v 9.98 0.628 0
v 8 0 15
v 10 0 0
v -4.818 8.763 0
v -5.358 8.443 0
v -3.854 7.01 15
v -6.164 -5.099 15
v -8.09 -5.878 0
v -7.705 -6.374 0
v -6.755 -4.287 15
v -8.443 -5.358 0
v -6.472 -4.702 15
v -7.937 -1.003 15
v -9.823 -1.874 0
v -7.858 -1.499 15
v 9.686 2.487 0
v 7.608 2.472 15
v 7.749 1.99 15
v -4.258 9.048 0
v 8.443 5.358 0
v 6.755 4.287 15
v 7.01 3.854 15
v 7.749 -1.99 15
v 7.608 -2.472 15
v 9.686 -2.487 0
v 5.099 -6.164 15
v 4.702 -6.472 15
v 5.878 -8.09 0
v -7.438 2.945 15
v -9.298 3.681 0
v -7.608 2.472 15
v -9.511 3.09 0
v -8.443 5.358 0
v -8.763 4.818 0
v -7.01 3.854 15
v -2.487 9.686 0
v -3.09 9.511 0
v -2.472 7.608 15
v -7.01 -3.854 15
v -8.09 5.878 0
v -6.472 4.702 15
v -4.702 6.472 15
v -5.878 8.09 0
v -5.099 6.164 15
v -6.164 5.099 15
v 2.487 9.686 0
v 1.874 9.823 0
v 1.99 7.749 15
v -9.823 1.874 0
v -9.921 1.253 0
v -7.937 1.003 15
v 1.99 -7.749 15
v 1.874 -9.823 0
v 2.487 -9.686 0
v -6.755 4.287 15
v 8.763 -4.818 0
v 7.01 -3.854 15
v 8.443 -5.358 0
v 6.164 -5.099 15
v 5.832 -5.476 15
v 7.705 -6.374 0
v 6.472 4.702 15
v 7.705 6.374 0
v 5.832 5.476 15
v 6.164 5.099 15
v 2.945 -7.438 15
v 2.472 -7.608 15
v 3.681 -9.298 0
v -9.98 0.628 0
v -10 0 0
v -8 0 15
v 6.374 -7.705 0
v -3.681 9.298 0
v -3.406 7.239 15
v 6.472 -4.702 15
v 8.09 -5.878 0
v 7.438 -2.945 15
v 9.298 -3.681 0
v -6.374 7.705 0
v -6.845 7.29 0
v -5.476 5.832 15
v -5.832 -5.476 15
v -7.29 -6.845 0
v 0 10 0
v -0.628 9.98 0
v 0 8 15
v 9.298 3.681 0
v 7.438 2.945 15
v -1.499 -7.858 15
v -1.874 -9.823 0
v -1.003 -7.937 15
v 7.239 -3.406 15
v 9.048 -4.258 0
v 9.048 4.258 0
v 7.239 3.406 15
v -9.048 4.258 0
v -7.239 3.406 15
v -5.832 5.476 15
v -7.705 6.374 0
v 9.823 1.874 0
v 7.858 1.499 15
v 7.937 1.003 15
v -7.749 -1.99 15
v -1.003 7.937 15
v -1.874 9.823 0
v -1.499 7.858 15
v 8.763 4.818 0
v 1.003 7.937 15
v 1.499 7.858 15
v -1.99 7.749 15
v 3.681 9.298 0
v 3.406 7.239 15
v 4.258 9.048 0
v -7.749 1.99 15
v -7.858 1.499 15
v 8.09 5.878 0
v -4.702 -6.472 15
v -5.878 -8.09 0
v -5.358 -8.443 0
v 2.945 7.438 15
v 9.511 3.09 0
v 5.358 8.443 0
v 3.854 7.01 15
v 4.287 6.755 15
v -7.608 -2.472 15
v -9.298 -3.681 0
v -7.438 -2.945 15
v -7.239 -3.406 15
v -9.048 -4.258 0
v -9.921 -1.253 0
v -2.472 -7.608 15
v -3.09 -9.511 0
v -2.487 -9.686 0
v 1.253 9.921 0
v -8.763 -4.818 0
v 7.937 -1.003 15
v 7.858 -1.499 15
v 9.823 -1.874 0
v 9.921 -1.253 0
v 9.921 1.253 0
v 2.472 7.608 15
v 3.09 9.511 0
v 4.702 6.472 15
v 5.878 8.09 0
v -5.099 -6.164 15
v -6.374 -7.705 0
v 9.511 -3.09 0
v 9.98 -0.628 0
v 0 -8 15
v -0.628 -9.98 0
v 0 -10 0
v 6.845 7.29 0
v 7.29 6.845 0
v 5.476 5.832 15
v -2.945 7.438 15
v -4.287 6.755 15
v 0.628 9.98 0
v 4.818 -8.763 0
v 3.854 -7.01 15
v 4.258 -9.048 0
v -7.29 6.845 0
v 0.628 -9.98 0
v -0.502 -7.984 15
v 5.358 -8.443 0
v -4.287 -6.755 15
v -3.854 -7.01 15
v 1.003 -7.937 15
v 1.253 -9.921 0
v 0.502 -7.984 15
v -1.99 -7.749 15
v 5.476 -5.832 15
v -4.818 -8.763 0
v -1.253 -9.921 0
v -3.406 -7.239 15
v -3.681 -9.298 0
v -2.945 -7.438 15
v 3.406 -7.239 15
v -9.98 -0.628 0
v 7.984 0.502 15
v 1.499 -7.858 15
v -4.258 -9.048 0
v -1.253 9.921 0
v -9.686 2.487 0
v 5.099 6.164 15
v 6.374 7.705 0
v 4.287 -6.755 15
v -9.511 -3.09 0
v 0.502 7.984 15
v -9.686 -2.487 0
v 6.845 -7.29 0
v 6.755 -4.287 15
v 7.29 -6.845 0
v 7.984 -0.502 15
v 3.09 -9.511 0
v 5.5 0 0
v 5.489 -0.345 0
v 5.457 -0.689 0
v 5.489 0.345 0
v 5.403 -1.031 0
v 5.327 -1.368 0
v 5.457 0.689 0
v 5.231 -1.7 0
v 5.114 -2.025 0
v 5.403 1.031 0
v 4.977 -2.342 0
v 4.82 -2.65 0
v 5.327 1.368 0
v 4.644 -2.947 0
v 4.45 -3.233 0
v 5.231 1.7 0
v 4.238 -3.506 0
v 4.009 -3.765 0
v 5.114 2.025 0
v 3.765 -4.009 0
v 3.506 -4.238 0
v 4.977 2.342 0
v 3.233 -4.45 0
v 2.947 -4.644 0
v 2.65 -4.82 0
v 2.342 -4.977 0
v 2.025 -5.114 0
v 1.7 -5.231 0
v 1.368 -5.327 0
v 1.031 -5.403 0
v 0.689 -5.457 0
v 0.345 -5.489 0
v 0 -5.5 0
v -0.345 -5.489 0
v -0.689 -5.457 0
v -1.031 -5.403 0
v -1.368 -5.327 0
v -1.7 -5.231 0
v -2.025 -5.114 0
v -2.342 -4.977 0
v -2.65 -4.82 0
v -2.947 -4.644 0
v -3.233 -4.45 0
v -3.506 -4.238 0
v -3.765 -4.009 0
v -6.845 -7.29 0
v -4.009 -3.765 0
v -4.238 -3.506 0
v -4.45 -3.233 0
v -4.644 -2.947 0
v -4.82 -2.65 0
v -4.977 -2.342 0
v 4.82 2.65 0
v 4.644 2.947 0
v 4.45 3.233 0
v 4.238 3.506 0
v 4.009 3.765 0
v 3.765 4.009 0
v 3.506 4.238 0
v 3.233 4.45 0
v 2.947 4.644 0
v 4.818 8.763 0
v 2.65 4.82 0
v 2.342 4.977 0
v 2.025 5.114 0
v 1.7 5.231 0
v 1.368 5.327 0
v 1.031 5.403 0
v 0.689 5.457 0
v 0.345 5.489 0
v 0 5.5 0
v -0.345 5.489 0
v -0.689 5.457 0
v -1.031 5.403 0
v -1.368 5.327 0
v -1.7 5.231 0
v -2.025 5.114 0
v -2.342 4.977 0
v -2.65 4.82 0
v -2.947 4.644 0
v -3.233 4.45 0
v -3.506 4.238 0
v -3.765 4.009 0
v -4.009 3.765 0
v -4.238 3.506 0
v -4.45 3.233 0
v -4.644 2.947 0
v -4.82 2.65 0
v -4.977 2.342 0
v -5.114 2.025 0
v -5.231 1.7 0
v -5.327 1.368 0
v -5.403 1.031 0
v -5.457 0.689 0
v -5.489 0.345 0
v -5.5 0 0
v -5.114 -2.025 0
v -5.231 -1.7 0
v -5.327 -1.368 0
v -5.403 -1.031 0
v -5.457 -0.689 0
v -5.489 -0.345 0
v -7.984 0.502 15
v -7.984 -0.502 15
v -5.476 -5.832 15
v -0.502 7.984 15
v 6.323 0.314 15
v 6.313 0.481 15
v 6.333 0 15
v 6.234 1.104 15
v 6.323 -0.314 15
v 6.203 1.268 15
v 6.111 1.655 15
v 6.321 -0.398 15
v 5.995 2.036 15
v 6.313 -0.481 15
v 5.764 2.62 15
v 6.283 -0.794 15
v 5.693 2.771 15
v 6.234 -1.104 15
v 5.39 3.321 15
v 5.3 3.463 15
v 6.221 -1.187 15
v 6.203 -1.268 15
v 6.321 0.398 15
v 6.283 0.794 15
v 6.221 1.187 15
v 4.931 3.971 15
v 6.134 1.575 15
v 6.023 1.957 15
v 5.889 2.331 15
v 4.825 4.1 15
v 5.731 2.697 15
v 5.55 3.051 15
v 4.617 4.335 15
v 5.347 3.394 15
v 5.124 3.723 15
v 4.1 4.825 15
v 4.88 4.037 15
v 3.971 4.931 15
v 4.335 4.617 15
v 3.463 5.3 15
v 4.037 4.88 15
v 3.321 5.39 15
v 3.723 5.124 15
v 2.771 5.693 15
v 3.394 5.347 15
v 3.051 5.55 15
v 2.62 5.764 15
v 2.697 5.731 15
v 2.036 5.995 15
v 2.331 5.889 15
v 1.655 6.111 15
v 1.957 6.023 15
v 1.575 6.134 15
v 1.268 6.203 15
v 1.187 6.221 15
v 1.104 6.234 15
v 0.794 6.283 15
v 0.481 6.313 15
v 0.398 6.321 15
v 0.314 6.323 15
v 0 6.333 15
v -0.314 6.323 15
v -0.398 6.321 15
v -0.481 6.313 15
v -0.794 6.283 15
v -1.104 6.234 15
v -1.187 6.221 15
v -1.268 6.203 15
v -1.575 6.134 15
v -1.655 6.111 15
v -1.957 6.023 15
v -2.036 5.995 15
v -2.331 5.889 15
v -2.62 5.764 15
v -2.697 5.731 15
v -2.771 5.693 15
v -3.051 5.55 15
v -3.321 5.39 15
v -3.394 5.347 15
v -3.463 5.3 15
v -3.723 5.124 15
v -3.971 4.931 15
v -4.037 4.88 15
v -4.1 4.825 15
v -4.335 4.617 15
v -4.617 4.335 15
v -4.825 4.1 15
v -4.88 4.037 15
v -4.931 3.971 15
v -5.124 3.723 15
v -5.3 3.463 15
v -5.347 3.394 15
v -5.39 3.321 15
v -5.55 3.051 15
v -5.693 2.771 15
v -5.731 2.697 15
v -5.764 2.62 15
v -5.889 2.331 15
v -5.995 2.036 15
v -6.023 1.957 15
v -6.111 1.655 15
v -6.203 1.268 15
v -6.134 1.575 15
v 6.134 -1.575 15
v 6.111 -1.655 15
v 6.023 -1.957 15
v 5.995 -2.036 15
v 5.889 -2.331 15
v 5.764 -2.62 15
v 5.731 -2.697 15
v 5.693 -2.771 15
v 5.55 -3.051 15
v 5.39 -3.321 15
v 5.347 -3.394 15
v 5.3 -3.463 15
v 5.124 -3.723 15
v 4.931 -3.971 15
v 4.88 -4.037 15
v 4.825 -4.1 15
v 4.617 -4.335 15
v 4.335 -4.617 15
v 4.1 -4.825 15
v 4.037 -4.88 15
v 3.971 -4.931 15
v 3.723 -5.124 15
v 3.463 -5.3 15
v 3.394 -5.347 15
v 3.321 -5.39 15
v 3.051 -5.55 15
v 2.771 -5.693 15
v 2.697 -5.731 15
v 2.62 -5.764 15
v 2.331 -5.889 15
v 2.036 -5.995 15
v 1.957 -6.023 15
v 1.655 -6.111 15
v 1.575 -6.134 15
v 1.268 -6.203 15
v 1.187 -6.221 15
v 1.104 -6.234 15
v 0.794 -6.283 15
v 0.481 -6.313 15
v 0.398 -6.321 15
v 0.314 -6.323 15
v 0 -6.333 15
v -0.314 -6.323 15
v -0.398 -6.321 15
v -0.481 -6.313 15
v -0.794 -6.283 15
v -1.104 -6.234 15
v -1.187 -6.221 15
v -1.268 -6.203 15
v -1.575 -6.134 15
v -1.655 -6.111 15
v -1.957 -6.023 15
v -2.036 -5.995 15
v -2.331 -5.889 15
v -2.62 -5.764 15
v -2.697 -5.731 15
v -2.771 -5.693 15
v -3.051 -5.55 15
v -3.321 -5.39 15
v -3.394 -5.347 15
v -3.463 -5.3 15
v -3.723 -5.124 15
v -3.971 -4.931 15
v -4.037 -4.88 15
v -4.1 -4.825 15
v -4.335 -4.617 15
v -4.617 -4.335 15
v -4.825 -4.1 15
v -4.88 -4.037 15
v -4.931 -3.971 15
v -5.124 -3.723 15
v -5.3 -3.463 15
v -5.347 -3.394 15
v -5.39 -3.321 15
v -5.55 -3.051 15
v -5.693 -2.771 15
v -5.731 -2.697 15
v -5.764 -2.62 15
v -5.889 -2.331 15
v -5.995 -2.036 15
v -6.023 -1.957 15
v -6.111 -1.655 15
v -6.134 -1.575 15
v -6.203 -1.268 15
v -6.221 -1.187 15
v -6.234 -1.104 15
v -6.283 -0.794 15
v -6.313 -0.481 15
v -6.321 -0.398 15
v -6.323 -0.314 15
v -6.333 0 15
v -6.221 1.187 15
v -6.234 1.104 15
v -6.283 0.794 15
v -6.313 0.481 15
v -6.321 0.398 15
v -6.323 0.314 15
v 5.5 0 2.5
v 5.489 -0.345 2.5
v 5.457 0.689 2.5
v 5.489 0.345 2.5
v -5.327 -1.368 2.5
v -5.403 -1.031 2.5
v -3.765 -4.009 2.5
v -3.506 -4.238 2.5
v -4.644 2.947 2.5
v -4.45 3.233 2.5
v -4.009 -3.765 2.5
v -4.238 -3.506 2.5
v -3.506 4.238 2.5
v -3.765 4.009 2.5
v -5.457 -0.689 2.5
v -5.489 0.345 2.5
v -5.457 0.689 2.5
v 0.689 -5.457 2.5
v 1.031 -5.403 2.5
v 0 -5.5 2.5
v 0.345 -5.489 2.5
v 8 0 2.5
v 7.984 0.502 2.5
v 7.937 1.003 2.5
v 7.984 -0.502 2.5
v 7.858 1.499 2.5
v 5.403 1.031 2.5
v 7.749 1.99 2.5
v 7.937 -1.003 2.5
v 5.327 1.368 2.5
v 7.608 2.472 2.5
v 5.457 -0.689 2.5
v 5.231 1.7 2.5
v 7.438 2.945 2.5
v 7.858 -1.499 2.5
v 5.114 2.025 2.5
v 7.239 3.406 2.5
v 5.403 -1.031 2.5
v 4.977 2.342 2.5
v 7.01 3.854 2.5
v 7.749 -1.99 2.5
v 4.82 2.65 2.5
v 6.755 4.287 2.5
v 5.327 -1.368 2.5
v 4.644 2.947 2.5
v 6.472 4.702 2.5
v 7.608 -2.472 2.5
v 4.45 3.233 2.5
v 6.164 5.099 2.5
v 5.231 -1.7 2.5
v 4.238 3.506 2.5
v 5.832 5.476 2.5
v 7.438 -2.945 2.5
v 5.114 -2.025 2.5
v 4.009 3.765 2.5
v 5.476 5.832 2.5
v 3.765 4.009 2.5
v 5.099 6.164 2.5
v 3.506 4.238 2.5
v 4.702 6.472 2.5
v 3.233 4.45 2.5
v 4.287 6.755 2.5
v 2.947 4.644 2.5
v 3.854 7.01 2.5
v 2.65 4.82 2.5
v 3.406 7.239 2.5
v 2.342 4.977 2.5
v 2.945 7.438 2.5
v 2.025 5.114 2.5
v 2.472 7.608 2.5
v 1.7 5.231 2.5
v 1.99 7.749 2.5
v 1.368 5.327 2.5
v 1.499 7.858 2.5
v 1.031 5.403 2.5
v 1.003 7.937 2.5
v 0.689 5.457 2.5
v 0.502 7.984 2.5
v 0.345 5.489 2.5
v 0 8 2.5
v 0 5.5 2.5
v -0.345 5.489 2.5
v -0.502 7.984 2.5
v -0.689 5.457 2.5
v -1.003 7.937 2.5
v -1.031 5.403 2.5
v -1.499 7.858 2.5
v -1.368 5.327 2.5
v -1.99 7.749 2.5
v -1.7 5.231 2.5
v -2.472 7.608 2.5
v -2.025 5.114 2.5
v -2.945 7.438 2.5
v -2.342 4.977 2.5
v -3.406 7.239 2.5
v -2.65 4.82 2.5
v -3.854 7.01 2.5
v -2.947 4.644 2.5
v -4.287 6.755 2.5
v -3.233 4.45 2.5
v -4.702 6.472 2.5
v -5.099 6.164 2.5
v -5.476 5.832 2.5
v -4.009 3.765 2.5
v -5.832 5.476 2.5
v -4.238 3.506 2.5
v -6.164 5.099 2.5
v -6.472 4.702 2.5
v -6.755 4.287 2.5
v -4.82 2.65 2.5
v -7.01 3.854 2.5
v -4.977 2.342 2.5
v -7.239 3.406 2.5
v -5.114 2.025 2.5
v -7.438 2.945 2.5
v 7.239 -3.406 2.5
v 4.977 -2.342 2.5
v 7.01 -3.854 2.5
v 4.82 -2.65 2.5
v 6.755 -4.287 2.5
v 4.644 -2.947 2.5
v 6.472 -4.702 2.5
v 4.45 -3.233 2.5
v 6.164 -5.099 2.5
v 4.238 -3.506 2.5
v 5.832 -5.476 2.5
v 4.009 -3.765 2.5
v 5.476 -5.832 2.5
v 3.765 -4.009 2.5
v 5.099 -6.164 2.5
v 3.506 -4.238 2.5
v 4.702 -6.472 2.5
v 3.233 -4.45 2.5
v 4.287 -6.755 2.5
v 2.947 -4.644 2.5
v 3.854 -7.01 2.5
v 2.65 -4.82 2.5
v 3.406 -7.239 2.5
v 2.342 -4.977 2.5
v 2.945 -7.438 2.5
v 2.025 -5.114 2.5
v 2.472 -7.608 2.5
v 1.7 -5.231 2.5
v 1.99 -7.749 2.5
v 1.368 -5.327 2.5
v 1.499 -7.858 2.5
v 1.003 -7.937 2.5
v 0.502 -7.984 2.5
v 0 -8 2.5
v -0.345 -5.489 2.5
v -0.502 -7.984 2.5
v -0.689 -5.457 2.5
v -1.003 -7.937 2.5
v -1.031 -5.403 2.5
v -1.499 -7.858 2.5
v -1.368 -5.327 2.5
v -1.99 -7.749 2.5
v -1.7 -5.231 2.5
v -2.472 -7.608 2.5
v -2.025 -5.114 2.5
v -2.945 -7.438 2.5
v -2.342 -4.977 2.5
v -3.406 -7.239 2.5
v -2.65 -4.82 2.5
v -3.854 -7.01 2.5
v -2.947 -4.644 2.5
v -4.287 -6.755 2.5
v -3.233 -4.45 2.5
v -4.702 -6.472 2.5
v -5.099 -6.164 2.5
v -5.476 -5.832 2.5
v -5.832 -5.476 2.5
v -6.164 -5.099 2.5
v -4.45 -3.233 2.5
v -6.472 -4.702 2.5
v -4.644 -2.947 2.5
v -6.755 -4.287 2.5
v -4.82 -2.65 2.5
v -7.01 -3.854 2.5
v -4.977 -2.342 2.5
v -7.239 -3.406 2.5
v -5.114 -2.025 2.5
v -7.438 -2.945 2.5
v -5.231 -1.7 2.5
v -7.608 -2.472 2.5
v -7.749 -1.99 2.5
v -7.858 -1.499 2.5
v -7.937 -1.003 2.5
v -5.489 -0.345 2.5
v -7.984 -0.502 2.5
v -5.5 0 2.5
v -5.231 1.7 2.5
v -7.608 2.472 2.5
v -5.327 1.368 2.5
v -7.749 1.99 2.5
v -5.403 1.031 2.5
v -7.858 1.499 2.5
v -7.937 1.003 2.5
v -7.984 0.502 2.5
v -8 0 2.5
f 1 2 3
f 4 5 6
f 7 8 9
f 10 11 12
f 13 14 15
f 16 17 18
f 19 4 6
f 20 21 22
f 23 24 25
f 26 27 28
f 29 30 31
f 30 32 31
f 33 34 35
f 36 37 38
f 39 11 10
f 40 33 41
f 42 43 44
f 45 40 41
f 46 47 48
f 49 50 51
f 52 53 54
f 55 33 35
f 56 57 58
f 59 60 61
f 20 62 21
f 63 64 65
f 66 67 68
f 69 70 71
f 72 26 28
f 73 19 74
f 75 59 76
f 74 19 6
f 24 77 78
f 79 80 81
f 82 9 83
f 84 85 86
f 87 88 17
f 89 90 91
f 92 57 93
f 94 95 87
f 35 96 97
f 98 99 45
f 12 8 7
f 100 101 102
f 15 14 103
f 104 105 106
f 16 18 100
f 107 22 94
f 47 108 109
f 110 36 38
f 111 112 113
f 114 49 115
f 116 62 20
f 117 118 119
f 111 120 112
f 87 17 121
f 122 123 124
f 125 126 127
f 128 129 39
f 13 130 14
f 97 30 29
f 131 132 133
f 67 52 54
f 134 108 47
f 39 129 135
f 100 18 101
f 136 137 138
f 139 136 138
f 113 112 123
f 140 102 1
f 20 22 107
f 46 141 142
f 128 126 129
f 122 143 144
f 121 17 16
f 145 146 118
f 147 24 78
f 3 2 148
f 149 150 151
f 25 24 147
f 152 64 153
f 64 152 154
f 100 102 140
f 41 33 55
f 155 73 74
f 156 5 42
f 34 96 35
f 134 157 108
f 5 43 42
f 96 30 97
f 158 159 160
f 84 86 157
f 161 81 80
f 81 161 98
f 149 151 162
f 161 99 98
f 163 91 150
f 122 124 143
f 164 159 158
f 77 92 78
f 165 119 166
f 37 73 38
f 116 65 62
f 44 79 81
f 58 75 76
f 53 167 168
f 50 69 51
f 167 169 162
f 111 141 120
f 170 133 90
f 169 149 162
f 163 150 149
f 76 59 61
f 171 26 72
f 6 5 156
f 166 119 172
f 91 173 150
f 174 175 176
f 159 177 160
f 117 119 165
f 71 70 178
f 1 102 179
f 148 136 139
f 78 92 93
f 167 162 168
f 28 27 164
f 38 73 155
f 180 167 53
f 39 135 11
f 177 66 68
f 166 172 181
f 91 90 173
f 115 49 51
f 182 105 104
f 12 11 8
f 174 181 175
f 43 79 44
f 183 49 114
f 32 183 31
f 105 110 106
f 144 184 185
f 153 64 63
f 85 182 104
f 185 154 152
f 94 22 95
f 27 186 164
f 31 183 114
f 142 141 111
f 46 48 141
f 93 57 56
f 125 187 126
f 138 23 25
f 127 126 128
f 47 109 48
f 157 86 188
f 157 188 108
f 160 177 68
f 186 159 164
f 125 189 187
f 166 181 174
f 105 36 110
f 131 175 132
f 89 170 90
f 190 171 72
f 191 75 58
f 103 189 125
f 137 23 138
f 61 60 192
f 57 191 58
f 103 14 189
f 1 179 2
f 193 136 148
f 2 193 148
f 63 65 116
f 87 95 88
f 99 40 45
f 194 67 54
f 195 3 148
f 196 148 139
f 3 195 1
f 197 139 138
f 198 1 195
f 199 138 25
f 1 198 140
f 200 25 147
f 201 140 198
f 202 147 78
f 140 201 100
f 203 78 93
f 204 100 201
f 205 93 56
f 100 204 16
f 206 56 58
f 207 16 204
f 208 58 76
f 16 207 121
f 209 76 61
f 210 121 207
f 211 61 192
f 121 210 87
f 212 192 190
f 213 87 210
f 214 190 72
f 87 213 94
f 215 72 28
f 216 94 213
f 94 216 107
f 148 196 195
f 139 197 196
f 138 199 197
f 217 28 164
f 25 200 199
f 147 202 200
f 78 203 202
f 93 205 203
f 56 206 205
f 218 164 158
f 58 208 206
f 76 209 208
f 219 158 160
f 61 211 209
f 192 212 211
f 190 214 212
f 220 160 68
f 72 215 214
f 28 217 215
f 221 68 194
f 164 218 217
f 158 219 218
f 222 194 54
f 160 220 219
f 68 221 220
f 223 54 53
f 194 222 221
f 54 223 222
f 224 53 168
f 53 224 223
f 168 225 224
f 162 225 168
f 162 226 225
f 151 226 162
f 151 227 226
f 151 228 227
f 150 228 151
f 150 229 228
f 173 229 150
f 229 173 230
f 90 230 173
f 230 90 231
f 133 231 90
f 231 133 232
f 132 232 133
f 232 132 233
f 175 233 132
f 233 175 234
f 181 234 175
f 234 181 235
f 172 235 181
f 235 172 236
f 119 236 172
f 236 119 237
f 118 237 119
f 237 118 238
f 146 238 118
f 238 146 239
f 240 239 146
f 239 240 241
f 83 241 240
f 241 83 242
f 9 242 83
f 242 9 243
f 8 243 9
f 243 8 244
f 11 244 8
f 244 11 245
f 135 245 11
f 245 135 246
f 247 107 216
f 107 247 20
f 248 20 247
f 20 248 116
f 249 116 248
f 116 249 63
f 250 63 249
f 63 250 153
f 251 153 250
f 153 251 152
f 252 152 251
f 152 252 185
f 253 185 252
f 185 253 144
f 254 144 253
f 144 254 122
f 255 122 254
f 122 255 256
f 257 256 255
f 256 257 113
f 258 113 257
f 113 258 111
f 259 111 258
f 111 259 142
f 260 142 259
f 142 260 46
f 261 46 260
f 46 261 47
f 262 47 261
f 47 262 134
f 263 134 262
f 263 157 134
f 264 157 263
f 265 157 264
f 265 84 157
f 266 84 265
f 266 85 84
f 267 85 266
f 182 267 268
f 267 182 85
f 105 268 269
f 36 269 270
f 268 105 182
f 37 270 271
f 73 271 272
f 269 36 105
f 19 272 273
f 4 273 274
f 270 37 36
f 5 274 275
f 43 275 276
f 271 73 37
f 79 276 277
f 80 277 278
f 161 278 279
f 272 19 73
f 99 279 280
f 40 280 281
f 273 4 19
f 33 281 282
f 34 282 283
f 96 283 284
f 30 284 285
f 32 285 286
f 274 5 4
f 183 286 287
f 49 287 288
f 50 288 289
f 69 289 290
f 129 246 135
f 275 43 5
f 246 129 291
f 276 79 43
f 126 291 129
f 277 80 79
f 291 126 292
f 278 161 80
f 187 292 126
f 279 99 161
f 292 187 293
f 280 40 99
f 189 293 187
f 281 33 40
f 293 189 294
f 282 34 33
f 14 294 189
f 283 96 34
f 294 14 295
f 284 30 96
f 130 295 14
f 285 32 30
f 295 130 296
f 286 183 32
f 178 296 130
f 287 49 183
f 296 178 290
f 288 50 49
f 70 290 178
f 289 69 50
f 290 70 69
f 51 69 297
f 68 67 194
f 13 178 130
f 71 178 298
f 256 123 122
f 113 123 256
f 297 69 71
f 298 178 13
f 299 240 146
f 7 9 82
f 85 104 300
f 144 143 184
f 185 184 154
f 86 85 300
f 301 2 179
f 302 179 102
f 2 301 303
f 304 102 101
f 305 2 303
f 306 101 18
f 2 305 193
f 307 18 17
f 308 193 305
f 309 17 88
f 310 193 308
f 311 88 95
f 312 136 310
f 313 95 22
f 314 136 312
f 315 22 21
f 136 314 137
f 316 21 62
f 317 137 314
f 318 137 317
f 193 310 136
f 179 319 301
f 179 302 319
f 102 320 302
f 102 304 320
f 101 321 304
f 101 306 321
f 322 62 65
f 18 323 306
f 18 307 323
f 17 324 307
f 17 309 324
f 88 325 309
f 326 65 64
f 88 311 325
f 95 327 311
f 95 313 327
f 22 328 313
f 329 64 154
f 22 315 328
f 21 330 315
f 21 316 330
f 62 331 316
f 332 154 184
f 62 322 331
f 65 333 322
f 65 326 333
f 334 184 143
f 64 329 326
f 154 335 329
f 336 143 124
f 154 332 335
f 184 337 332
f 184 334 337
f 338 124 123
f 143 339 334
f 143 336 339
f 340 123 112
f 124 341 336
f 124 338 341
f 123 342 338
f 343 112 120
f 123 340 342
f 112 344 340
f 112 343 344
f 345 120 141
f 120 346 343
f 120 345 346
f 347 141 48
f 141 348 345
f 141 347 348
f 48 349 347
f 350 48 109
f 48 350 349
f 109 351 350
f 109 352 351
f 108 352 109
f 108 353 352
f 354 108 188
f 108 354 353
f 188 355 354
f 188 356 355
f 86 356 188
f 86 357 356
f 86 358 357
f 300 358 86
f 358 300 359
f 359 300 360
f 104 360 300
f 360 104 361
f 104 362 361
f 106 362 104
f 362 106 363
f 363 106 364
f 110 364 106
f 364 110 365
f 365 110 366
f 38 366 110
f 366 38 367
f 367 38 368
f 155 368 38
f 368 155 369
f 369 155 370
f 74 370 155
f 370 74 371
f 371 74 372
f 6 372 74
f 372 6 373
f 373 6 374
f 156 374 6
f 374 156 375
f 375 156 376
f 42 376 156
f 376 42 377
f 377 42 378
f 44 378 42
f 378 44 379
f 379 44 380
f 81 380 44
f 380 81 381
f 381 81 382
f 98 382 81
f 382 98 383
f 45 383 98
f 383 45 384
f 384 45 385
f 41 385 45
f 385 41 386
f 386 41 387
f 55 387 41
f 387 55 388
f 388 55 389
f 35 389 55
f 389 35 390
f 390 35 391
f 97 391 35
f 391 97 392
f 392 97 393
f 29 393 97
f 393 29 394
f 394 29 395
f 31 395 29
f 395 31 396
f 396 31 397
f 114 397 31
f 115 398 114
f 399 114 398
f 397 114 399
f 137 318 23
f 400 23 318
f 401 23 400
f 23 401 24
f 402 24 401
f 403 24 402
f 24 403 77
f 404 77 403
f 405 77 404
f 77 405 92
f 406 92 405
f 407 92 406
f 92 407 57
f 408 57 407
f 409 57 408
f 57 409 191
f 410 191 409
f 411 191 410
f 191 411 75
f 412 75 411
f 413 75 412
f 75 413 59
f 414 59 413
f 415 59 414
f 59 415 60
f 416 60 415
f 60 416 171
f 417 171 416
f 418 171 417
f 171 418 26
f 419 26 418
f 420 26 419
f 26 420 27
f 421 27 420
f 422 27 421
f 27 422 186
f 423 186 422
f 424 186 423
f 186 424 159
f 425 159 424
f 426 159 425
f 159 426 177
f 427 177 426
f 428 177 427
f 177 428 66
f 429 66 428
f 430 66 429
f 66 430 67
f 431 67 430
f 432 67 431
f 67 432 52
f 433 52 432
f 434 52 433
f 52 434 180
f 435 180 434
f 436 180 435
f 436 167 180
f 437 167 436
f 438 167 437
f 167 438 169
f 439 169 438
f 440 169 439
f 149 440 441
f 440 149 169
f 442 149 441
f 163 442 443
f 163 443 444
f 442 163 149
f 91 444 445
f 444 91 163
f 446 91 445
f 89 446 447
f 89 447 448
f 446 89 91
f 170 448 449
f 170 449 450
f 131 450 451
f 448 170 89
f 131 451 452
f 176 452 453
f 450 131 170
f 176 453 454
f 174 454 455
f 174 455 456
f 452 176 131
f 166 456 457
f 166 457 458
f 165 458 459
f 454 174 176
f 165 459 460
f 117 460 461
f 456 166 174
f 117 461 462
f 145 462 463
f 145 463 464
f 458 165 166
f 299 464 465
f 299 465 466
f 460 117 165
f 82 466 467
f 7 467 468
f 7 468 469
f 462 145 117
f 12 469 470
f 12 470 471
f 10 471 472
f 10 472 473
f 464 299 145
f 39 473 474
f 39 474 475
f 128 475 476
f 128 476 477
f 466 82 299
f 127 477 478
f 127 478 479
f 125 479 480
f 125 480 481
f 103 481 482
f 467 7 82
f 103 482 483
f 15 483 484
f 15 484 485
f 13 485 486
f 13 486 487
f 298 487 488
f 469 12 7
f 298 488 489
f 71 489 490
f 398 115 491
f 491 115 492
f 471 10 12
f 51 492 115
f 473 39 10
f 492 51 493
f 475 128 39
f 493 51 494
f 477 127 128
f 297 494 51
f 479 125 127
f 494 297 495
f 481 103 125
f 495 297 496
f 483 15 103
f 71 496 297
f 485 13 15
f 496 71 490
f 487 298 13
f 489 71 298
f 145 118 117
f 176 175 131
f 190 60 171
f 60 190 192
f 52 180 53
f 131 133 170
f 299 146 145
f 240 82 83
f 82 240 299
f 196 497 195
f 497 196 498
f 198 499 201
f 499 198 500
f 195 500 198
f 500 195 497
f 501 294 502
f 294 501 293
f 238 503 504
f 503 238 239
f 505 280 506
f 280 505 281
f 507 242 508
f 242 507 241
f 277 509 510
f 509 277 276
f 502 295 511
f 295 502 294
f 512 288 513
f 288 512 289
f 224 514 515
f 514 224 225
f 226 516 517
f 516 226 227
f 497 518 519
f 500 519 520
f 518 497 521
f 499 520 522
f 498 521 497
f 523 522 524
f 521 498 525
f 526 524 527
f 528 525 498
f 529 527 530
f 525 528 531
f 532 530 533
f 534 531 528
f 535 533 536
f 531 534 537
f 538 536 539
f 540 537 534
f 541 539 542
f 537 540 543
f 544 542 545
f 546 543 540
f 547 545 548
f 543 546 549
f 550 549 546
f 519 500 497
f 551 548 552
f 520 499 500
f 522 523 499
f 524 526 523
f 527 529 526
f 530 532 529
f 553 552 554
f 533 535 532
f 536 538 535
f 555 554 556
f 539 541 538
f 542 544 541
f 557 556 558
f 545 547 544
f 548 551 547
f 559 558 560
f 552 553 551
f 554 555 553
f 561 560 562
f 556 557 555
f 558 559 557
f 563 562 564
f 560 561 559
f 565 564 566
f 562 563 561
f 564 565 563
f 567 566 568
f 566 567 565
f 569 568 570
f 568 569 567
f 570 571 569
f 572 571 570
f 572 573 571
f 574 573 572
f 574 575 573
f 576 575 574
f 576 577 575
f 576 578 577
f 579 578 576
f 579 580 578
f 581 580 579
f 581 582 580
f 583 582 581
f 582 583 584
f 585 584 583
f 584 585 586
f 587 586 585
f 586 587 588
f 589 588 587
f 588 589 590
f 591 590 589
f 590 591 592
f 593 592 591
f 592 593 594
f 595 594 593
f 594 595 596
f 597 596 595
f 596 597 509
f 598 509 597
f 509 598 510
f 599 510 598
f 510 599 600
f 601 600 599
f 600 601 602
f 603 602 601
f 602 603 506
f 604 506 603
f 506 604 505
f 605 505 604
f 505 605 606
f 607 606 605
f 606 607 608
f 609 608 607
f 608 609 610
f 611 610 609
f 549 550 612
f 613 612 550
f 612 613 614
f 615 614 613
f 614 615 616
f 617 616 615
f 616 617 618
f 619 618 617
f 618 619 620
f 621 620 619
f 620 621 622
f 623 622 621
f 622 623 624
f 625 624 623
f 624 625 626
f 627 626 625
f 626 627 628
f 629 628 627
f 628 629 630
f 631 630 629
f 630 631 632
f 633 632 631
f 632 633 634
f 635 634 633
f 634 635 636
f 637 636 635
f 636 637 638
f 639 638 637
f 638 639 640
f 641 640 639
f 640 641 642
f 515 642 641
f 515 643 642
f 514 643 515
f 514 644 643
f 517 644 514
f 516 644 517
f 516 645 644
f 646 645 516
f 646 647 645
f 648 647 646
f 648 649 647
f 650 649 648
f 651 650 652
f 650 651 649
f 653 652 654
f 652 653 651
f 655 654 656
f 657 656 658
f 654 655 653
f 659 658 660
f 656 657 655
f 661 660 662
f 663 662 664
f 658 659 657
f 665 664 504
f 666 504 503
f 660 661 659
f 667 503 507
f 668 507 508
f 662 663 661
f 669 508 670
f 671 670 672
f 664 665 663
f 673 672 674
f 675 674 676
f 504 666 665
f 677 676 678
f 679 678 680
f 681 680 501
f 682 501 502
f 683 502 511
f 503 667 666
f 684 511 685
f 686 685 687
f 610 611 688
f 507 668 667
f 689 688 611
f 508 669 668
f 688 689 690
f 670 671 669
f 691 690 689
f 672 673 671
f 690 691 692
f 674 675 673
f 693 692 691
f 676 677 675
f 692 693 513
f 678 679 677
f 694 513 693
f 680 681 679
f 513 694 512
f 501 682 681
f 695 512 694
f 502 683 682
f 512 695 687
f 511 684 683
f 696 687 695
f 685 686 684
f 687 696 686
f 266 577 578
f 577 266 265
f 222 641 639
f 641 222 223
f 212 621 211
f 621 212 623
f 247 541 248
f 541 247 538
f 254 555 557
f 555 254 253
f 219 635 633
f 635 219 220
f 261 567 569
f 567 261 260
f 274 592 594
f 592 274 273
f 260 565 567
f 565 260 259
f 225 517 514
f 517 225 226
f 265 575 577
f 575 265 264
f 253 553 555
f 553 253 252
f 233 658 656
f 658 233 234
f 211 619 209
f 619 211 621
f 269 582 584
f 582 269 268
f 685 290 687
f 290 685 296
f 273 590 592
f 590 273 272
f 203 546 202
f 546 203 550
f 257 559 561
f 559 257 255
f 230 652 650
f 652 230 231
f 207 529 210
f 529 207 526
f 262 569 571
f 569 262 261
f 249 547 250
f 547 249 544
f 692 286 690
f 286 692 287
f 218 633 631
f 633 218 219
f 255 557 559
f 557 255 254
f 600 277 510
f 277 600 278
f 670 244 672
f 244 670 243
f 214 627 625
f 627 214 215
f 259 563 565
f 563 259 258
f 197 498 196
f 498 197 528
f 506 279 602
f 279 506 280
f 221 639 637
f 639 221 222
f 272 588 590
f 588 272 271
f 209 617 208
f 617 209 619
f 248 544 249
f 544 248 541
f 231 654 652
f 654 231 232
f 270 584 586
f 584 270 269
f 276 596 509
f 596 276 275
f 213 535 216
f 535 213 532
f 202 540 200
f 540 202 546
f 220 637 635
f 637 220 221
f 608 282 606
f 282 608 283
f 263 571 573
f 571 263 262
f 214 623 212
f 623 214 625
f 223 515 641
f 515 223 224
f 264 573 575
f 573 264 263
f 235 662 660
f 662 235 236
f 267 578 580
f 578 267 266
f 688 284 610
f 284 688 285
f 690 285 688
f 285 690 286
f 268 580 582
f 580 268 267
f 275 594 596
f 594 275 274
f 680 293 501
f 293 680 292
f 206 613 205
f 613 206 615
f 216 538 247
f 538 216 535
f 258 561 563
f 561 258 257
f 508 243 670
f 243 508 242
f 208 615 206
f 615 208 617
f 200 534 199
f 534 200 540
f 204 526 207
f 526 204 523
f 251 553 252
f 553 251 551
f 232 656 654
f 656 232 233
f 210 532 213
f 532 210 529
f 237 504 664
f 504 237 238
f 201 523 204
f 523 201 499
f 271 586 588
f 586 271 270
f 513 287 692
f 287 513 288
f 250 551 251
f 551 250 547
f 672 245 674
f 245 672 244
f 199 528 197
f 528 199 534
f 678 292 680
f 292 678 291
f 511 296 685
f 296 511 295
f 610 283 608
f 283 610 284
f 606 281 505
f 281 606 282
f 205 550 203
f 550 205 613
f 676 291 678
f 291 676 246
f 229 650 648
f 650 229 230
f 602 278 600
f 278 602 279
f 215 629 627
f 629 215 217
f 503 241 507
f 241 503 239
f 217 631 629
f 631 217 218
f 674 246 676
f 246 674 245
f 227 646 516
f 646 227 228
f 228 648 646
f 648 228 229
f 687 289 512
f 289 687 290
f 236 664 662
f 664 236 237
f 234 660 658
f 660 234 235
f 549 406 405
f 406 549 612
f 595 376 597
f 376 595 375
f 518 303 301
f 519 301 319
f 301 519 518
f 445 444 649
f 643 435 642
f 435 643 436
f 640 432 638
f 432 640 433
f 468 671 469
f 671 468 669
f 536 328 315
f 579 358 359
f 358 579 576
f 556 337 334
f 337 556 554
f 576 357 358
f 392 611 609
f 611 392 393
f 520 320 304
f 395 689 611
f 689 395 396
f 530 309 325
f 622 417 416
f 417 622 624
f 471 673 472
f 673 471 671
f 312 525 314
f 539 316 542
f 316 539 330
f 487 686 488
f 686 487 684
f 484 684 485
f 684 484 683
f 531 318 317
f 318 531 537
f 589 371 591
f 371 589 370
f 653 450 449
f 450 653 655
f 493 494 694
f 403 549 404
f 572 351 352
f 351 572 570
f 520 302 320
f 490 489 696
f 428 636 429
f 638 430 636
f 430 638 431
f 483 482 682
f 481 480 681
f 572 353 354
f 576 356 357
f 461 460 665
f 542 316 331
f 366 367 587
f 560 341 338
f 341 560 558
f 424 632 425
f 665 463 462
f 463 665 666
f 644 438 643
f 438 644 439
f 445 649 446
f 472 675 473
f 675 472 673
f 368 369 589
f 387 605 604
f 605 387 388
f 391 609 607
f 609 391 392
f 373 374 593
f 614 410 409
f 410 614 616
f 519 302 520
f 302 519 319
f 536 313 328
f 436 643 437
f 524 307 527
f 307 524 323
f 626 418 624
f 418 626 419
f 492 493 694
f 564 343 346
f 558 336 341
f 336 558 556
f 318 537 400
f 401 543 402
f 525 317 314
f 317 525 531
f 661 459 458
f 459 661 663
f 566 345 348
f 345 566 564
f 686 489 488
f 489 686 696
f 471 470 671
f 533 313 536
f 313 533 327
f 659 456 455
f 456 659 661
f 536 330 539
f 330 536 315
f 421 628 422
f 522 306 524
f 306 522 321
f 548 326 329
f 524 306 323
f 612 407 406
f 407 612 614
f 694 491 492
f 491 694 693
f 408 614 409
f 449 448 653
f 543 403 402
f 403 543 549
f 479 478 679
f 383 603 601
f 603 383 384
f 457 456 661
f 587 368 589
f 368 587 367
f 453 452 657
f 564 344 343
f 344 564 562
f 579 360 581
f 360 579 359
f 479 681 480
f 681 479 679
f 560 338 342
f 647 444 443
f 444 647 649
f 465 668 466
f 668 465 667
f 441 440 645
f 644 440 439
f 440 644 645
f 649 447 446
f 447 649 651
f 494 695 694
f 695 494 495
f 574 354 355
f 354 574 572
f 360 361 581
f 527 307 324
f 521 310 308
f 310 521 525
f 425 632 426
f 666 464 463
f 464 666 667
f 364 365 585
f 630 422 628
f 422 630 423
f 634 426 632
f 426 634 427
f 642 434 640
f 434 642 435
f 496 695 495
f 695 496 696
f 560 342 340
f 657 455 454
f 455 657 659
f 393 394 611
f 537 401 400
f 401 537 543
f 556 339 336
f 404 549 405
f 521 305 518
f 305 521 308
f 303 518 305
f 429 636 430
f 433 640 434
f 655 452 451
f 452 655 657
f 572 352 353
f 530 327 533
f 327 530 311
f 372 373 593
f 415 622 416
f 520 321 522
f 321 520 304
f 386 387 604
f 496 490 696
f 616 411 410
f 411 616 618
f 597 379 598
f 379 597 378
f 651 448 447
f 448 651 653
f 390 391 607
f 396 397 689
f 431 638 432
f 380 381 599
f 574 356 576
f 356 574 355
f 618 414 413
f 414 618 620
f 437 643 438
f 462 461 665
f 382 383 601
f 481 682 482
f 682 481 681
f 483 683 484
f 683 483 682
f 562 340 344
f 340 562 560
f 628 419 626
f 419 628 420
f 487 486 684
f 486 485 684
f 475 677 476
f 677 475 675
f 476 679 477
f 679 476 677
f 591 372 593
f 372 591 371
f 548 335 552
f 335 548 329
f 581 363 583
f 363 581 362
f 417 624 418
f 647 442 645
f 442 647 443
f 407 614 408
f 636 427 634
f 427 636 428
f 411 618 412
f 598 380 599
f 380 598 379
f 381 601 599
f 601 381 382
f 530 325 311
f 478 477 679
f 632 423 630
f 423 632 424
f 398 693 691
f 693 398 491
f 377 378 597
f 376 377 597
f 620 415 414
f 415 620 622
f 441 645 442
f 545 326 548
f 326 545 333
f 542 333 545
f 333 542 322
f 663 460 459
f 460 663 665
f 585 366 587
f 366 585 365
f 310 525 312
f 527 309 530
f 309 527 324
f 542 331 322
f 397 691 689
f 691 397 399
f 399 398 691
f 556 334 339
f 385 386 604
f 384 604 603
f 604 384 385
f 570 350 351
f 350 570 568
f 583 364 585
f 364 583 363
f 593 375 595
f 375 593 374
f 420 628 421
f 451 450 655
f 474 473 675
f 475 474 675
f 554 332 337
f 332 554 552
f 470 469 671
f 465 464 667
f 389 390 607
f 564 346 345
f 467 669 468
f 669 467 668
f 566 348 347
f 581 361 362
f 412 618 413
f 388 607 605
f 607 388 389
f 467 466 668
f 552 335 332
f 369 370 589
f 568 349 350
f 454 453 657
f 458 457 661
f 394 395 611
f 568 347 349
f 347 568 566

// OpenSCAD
IRON_DIA = 11;
IRON_LENGTH = 2.5;

BASE_DIA_TOP = 16;
BASE_DIA_BOT = 20;
BASE_LENGTH = 15;

WALL_THICKNESS = 2;

$fn = 100;

module adapter() {
  difference() {
    union() {
      cylinder(d1 = BASE_DIA_BOT, d2 = BASE_DIA_TOP, h = BASE_LENGTH);
    }

    #cylinder(d = IRON_DIA, h = IRON_LENGTH);

    #translate([0, 0, IRON_LENGTH])
    cylinder(d1 = BASE_DIA_BOT - WALL_THICKNESS * 2, d2 = BASE_DIA_TOP - WALL_THICKNESS * 2, h = BASE_LENGTH);
  }
}

adapter();
